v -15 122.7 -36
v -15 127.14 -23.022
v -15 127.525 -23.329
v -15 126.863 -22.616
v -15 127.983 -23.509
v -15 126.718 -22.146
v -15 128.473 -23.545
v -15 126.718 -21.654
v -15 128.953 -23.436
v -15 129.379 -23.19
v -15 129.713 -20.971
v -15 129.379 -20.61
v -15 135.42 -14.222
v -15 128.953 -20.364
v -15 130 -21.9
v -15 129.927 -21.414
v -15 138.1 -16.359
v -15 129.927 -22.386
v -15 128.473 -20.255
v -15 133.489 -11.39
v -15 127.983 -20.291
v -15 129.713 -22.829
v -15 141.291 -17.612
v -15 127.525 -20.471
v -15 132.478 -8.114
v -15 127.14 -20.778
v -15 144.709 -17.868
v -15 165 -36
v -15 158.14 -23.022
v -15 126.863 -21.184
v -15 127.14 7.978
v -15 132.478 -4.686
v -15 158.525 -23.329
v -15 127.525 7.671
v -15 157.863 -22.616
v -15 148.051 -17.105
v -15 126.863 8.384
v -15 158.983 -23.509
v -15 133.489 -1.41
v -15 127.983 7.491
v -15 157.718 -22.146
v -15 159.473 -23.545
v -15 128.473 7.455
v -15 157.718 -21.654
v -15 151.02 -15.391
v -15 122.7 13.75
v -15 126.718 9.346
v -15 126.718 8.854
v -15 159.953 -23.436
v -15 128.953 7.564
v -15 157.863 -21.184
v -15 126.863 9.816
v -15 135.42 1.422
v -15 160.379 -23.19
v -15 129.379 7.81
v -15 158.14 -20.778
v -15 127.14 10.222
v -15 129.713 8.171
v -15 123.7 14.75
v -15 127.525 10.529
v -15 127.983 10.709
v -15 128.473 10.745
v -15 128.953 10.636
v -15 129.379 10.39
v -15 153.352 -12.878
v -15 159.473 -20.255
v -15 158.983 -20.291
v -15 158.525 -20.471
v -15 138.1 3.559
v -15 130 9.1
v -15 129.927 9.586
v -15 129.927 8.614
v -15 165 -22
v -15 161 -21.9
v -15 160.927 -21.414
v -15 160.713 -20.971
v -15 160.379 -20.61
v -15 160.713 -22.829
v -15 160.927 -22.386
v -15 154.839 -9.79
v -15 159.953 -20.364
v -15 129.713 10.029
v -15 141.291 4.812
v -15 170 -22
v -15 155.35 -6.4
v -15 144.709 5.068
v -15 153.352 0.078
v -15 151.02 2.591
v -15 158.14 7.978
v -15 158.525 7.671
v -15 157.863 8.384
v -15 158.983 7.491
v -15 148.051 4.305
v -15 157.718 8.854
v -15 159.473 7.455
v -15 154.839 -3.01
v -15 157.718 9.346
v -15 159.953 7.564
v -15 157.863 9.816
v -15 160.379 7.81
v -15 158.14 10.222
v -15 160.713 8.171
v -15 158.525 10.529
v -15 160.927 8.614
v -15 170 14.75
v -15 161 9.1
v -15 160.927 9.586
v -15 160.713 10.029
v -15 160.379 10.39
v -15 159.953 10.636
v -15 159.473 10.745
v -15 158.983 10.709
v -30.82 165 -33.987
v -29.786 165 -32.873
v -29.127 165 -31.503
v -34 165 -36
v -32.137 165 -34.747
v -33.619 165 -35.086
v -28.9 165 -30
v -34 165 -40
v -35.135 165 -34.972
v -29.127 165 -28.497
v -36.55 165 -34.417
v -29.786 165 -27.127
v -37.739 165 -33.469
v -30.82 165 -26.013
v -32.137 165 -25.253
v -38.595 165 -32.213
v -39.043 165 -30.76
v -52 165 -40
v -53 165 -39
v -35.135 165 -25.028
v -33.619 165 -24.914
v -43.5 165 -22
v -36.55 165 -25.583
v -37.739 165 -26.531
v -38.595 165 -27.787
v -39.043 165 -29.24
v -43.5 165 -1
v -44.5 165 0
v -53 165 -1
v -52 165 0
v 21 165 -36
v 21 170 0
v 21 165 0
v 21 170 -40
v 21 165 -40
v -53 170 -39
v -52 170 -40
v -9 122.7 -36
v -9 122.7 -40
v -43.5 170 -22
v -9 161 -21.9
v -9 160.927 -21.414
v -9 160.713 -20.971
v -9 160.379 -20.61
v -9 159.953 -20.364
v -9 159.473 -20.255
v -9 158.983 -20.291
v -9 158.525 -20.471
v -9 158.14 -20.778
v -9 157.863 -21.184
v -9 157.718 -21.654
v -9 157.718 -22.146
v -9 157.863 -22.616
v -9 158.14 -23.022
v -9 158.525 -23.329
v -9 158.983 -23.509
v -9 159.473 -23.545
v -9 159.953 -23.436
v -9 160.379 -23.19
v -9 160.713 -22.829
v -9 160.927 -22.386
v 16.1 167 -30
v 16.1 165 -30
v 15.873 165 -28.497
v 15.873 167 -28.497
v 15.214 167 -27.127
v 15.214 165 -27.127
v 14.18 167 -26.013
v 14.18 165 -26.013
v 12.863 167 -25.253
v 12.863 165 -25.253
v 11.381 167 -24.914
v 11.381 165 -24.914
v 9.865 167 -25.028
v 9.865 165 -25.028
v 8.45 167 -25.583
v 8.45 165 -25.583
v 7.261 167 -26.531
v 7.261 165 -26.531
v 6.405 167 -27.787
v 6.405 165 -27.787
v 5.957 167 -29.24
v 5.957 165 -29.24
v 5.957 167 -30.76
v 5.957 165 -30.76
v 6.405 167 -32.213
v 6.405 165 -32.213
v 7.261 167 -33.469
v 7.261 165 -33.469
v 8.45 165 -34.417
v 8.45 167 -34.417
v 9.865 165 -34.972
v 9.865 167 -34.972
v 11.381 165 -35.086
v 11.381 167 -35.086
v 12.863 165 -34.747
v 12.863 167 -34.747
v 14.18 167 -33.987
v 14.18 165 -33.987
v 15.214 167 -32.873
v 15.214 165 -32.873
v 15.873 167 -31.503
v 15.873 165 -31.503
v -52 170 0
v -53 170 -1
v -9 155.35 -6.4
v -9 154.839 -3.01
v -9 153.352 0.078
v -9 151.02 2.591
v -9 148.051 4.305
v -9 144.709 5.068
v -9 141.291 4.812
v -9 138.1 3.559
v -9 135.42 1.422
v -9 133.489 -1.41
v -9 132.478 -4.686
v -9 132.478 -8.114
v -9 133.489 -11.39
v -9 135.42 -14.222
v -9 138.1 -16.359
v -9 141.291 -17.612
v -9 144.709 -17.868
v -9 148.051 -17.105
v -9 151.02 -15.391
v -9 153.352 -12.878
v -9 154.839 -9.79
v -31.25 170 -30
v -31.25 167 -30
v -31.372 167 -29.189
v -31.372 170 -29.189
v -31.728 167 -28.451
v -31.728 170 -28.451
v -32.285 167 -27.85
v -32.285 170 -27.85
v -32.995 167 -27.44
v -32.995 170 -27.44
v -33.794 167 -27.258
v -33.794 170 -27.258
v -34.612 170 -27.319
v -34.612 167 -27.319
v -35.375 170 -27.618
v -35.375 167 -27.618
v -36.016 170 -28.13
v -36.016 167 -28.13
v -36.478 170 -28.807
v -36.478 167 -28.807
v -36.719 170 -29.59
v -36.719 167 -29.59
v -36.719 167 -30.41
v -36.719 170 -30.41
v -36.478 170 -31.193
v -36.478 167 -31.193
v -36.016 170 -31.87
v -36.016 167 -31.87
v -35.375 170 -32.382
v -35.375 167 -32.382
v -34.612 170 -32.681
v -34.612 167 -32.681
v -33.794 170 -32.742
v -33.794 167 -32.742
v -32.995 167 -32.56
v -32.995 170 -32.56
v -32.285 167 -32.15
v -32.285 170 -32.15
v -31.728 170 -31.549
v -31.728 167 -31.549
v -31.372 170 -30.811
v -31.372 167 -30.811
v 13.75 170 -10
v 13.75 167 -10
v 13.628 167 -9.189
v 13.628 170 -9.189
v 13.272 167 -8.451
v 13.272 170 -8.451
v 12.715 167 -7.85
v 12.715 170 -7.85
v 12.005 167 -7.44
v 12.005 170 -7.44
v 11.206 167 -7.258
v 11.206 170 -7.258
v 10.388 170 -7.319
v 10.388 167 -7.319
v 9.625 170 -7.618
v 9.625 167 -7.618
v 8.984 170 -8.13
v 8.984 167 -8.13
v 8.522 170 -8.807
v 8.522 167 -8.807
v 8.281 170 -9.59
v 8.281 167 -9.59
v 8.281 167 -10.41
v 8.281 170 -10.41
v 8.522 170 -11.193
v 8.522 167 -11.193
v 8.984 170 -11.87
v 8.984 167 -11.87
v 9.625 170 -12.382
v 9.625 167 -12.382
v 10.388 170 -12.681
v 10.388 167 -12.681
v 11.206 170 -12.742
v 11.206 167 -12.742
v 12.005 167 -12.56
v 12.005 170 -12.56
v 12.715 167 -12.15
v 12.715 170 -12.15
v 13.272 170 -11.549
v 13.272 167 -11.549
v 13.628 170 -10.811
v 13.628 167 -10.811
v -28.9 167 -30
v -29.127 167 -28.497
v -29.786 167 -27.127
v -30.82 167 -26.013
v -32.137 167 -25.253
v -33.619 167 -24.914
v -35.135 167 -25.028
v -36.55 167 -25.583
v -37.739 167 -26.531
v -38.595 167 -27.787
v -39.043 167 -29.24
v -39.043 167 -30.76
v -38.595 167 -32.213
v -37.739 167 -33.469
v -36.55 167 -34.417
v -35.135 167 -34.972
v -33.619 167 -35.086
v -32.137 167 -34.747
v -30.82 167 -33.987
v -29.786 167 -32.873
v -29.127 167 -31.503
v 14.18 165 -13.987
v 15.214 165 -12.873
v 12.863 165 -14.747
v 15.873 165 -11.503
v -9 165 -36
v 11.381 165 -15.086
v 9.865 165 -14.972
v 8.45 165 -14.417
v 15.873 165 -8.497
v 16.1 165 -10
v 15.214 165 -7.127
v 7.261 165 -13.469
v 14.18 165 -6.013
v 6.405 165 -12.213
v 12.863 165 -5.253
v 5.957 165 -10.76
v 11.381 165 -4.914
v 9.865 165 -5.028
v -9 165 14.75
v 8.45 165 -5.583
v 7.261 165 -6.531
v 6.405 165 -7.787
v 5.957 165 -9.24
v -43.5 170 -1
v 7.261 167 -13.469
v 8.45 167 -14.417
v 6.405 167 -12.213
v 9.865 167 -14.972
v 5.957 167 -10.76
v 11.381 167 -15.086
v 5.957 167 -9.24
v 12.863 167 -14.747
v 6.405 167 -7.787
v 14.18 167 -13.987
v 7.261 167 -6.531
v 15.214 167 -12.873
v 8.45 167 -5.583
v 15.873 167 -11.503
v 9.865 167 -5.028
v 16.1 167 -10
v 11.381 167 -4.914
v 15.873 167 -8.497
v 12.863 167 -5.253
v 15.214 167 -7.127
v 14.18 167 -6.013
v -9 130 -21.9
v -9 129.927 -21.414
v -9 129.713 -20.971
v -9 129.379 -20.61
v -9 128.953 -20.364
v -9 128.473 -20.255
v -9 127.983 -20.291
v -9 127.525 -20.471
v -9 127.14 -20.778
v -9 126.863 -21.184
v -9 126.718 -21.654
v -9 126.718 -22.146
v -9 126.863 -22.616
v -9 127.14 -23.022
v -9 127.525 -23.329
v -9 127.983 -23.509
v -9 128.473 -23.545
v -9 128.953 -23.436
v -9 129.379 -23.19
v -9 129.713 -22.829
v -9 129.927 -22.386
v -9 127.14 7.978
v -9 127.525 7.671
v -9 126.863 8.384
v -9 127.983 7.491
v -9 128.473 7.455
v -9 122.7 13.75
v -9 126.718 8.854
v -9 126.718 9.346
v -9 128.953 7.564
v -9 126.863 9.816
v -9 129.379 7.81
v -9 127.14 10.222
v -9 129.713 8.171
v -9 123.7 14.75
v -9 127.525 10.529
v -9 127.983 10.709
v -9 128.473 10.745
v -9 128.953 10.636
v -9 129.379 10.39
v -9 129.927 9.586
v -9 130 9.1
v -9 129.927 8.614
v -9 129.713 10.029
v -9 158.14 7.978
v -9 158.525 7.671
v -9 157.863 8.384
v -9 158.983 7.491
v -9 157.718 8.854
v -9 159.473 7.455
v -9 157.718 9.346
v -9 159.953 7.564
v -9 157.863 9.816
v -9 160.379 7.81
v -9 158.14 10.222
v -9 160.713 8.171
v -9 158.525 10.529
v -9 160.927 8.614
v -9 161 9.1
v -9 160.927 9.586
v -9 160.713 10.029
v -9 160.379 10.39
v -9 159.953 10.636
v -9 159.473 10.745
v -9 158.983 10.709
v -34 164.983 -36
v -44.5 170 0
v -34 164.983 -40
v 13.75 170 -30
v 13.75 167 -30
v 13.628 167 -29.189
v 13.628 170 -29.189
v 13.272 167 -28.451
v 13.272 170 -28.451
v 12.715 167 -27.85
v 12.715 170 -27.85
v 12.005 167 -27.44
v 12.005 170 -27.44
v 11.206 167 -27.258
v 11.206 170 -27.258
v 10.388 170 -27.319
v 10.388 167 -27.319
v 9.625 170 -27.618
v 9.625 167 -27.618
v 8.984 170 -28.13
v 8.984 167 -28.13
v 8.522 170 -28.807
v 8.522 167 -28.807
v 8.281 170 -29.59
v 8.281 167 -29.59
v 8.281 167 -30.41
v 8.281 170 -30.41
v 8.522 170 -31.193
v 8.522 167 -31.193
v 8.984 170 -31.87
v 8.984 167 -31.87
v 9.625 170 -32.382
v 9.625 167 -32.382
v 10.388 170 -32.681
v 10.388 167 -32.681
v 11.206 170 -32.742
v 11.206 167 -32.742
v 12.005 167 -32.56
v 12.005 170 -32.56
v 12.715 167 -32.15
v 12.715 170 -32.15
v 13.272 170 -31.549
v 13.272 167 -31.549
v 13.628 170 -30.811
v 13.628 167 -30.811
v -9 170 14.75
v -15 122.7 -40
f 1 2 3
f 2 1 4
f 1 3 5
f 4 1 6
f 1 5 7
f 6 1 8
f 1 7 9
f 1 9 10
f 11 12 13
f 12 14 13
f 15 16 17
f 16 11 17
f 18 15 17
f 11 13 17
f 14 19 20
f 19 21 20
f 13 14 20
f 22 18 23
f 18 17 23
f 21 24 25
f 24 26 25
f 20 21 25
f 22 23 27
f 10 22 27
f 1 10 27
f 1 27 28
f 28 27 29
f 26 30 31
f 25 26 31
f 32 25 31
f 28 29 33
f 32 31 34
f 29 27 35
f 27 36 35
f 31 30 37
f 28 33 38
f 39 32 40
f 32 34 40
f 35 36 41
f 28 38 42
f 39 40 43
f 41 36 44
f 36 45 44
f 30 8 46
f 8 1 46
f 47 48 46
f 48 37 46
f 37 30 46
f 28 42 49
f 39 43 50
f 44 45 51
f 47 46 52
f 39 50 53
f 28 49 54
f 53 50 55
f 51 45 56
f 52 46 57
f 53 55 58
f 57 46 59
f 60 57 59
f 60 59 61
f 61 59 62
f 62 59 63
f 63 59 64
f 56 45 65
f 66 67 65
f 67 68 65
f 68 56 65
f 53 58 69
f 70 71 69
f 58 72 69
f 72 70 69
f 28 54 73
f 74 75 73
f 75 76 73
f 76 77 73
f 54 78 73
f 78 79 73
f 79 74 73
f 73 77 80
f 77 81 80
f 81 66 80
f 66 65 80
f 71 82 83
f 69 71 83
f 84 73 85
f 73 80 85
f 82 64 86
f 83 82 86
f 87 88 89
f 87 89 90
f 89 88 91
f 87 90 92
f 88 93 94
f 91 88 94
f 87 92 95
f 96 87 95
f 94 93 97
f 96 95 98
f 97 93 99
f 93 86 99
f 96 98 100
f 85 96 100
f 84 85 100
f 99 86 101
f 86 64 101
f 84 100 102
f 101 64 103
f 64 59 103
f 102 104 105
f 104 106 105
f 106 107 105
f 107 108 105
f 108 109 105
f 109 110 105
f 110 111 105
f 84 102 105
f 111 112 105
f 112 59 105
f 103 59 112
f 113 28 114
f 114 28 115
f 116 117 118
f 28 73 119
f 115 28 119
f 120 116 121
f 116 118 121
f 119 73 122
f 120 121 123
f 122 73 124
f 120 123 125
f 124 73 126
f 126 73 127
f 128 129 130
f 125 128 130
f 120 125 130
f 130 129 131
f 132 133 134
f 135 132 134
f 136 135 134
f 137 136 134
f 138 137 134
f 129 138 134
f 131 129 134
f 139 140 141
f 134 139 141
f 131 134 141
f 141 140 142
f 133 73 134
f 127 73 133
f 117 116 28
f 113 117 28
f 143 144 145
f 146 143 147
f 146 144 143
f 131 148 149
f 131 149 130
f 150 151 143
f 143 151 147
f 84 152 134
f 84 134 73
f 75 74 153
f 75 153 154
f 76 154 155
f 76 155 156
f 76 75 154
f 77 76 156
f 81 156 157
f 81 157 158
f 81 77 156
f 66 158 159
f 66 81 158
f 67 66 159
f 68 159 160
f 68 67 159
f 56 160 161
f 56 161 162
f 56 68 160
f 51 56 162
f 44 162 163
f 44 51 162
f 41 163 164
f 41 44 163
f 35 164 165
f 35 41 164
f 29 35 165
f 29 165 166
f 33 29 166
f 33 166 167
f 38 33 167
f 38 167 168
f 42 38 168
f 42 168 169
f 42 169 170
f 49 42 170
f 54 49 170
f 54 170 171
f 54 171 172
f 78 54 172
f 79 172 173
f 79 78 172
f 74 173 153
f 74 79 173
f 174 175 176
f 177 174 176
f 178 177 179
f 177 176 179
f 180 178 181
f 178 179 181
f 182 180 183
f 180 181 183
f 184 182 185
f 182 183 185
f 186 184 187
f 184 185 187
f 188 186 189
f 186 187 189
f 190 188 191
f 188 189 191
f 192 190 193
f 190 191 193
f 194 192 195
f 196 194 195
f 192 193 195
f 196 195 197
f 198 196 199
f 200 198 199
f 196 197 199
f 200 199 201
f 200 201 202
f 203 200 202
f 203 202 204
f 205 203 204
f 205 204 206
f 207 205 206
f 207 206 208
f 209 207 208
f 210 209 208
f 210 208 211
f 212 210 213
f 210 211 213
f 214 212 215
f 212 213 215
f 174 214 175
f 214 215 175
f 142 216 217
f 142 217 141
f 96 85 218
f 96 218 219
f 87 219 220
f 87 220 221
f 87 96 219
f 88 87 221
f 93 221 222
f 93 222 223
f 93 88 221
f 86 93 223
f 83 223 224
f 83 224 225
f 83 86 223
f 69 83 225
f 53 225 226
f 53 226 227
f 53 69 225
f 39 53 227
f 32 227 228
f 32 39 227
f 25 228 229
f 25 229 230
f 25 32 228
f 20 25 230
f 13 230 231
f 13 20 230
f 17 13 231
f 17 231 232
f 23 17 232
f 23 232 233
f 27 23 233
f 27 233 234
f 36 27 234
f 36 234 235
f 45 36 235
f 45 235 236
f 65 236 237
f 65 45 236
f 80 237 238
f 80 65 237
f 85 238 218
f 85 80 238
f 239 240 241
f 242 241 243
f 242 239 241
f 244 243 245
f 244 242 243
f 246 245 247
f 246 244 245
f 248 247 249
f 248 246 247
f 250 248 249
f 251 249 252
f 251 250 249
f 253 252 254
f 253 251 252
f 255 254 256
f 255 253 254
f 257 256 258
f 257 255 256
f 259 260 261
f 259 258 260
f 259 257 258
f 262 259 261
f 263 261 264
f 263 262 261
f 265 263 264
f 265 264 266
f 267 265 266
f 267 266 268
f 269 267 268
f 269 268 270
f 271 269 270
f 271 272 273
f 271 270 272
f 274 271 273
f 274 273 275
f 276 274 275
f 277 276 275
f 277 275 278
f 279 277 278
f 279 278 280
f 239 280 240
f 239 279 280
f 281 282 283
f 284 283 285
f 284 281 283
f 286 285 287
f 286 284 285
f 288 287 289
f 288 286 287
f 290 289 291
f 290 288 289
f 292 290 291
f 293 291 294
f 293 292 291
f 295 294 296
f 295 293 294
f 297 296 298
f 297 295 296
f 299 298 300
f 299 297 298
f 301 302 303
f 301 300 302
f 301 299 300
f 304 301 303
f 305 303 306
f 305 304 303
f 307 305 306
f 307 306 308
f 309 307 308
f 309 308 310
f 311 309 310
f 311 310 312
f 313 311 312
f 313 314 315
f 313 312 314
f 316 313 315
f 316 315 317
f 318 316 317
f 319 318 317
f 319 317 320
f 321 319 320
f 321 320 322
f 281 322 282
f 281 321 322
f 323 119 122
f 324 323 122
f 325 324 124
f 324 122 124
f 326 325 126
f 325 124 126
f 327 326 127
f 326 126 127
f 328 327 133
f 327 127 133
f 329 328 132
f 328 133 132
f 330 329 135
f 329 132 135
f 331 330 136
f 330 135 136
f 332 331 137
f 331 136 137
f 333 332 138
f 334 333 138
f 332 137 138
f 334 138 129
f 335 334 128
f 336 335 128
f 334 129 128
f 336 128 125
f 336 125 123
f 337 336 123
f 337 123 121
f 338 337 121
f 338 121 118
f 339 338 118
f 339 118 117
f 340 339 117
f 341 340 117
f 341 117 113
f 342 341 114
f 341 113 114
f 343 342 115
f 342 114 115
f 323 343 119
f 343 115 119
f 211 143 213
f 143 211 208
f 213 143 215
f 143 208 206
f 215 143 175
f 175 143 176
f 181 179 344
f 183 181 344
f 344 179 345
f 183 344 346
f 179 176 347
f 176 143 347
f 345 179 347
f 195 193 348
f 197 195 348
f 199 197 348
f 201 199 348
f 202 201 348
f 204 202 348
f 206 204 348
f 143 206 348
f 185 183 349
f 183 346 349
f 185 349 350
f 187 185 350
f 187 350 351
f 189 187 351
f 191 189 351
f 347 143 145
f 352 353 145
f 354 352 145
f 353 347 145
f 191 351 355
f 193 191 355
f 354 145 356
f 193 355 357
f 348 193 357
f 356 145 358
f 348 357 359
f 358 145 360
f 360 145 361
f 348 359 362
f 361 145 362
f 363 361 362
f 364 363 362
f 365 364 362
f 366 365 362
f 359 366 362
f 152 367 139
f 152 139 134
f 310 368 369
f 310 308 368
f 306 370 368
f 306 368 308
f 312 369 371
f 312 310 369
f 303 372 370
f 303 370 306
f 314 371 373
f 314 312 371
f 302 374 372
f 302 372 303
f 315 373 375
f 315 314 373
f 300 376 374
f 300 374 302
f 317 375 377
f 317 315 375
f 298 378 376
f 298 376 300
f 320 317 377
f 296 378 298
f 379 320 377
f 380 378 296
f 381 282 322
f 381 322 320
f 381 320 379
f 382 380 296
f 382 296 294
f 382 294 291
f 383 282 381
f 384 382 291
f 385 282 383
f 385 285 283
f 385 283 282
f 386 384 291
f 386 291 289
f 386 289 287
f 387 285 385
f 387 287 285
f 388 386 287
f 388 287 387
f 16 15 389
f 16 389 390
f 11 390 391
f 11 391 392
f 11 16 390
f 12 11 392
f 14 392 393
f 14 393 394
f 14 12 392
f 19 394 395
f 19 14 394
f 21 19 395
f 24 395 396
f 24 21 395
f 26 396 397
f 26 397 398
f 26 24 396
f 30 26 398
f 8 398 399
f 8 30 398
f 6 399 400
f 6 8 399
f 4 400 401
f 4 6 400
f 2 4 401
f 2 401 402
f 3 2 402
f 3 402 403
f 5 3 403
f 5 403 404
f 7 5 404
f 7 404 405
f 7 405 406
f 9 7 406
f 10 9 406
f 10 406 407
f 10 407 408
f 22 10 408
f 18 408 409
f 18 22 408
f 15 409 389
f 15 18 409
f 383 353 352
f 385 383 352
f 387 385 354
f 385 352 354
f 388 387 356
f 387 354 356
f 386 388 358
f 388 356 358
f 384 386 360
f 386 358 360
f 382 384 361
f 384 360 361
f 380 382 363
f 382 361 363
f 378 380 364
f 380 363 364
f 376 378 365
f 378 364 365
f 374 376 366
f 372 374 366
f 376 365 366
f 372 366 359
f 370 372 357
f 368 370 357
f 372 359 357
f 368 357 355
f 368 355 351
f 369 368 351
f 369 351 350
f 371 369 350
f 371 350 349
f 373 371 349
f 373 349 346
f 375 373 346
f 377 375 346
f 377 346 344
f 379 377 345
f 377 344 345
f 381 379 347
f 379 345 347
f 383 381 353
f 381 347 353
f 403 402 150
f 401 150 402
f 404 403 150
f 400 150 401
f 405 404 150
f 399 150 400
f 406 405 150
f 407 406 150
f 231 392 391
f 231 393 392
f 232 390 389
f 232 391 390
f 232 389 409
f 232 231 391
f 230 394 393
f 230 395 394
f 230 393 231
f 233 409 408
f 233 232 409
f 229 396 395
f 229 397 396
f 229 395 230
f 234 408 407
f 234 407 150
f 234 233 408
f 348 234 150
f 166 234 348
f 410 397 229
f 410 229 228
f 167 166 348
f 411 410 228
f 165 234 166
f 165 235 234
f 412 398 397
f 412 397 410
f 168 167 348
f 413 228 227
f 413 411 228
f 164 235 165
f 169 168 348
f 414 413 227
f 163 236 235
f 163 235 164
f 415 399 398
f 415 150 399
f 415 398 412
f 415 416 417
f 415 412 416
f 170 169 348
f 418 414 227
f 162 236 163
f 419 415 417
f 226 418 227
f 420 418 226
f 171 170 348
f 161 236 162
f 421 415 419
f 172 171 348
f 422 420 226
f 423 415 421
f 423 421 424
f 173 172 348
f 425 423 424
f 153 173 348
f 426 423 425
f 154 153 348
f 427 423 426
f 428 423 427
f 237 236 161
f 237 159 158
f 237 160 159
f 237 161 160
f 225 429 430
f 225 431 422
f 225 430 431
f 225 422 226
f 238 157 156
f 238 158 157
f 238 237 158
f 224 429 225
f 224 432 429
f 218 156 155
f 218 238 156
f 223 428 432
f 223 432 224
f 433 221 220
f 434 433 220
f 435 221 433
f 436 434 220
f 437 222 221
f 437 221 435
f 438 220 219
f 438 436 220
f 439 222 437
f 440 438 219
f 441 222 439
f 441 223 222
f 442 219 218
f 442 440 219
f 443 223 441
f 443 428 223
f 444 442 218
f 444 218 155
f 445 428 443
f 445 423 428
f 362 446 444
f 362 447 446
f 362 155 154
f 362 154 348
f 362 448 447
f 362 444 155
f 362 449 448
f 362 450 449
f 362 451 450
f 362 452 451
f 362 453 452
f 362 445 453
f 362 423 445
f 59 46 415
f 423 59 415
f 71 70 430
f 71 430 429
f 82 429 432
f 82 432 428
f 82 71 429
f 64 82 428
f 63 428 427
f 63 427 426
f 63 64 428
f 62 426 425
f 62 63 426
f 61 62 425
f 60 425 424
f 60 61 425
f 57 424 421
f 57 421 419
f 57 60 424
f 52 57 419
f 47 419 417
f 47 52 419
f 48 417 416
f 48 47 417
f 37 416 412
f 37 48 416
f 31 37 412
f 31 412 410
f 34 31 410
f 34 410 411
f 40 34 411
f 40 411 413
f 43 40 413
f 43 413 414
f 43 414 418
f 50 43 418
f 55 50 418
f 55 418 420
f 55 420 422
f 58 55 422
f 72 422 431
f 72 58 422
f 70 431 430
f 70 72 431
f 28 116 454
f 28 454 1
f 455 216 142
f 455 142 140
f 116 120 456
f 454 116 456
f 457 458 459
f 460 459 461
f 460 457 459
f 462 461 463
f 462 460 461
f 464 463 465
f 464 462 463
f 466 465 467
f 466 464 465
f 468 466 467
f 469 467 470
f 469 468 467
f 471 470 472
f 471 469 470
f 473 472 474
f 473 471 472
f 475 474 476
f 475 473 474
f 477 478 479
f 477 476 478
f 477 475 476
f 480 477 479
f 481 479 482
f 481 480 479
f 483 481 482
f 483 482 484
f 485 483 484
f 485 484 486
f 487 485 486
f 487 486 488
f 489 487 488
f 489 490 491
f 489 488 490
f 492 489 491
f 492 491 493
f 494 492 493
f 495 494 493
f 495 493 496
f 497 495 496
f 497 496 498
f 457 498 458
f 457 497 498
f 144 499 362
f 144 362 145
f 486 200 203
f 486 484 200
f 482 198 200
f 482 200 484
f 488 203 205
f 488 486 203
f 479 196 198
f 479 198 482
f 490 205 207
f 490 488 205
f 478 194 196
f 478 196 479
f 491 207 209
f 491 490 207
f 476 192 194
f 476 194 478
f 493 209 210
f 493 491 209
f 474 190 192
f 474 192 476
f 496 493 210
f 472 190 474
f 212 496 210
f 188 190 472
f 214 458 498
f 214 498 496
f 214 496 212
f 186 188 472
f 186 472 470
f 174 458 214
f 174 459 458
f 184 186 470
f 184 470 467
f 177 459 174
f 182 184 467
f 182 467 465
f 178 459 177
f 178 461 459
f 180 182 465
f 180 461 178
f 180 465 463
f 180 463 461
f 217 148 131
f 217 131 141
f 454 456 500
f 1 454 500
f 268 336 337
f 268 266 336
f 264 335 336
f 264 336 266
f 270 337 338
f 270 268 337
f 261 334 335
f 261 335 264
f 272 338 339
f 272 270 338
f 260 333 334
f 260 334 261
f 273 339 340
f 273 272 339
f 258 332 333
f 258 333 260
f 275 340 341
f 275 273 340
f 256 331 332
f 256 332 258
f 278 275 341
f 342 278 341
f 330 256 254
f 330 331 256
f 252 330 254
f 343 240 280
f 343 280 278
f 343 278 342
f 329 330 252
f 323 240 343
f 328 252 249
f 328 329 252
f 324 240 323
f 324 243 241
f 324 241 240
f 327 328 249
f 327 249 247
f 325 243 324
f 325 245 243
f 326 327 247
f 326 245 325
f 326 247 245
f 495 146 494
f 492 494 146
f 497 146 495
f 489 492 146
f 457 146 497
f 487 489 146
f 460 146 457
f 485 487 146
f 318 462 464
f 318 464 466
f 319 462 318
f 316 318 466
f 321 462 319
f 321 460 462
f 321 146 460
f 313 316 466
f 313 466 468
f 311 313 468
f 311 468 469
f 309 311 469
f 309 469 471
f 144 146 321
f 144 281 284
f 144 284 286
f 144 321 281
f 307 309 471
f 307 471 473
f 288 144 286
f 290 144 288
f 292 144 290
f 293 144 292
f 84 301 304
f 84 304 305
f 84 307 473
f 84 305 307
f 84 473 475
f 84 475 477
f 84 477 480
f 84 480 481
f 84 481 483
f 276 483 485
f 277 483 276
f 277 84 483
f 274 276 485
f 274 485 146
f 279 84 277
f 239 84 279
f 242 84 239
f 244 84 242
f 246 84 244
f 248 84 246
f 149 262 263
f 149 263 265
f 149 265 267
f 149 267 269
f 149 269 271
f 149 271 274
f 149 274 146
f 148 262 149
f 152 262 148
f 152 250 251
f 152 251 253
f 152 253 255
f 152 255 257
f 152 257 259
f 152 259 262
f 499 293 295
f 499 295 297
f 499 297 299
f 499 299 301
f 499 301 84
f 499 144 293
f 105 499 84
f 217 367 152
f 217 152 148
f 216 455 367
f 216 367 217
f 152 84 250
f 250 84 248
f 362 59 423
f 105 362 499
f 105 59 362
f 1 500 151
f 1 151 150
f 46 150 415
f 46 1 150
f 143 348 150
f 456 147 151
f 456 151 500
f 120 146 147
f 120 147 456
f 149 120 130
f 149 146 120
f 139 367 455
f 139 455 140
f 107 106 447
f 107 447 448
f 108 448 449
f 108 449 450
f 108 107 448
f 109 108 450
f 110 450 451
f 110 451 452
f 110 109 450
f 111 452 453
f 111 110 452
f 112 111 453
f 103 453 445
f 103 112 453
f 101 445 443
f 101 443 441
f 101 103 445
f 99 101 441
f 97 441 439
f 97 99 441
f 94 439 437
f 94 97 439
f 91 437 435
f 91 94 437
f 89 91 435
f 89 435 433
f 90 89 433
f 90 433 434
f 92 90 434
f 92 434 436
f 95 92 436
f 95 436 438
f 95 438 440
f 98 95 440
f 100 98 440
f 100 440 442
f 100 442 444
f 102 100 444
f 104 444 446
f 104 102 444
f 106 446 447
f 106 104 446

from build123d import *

# Parameters (mm, degrees)
SKETCH003_W   = 47.3
SKETCH003_H   = 54.75
SKETCH003_R   = 11.5
SKETCH003_R_2 = 1.65
PAD001_DEPTH  = 6
SKETCH005_R   = 2.75
PAD003_DEPTH  = 5
PAD002_DEPTH  = 4
SKETCH_R      = 5.1
POCKET_DEPTH  = 2
CHAMFER_SIZE  = 1


with BuildPart() as part:
    # Sketch003 → Pad001 (new body)
    with BuildSketch(Plane.YZ):
        with Locations((-23.65, 27.375)):
            Rectangle(SKETCH003_W, SKETCH003_H)
        with Locations((-26.15, 33.6)):
            Circle(SKETCH003_R, mode=Mode.SUBTRACT)
        with Locations((-41.65, 49.1)):
            Circle(SKETCH003_R_2, mode=Mode.SUBTRACT)
        with Locations((-10.65, 49.1)):
            Circle(SKETCH003_R_2, mode=Mode.SUBTRACT)
        with Locations((-41.65, 18.1)):
            Circle(SKETCH003_R_2, mode=Mode.SUBTRACT)
        with Locations((-10.65, 18.1)):
            Circle(SKETCH003_R_2, mode=Mode.SUBTRACT)
    extrude(amount=PAD001_DEPTH)

    # Sketch005 → Pad003 (join)
    with BuildSketch(Plane.XZ):
        Polygon((-38, 40), (-28.5, 40), (-28.5, 18), (0, 18), (0, 54.75), (6, 54.75), (36, 40), (36, 0), (-38, 0), align=None)
        with Locations((-19, 10)):
            Circle(SKETCH005_R, mode=Mode.SUBTRACT)
        with Locations((26, 30)):
            Circle(SKETCH005_R, mode=Mode.SUBTRACT)
        with Locations((26, 10)):
            Circle(SKETCH005_R, mode=Mode.SUBTRACT)
    extrude(amount=PAD003_DEPTH)

    # Sketch004 → Pad002 (join)
    with BuildSketch(Plane.XY):
        Polygon((-19, 0), (-19, -5.017162), (0, -47.3), (6, -47.3), (36, -5), (36, 0), align=None)
    extrude(amount=PAD002_DEPTH)

    # Sketch → Pocket (cut)
    with BuildSketch(Plane.XZ.offset(5)):
        with Locations((-19, 10)):
            Circle(SKETCH_R)
        with Locations((26, 30)):
            Circle(SKETCH_R)
        with Locations((26, 10)):
            Circle(SKETCH_R)
    extrude(amount=-POCKET_DEPTH, mode=Mode.SUBTRACT)

    # Chamfer
    chamfer_edges = [part.edges().sort_by_distance(p)[0] for p in [
        (3, -47.3, 54.75),
        (-28.5, -2.5, 40),
        (-38, -2.5, 40),
        (-38, -2.5, 0),
    ]]
    chamfer(chamfer_edges, length=CHAMFER_SIZE)


with BuildPart() as part_1:
    # Body001082 placement: moved
    add(part.part.moved(Location((-15, 170, -40))))


solid = part_1.part
